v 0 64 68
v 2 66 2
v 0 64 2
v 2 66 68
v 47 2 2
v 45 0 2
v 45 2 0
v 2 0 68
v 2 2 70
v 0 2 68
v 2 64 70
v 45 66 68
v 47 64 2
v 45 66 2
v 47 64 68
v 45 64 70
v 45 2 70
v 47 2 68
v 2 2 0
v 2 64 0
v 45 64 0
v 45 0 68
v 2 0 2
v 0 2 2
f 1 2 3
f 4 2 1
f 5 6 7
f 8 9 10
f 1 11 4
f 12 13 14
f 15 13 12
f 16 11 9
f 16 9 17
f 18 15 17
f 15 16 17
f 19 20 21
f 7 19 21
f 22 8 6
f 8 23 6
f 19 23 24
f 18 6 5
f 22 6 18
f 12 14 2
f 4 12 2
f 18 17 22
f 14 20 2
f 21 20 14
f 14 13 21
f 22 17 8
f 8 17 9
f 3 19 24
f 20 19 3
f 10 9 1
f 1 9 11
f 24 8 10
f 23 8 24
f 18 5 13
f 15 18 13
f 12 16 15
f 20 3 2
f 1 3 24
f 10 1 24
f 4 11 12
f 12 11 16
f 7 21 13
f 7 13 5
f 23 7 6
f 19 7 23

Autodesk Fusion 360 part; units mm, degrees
sketch "Sketch1" plane through (0, 0, 0) normal (0, 0, 1) x (1, 0, 0)
  line L0 (0, 0) -> (47, 0)
  line L1 (47, 0) -> (47, 66)
  line L2 (47, 66) -> (0, 66)
  line L3 (0, 66) -> (0, 0)
  dimension "d1" = 47
  dimension "d2" = 66
extrude "Extrude1" add sketch "Sketch1" along normal blind 70
chamfer "Chamfer1" distance 2 angle 45 6 faces at (15.6667, 44, 70) (15.6667, 0, 23.3333) (47, 22, 23.3333) (0, 44, 23.3333) (31.3333, 66, 23.3333) (15.6667, 44, 0)
